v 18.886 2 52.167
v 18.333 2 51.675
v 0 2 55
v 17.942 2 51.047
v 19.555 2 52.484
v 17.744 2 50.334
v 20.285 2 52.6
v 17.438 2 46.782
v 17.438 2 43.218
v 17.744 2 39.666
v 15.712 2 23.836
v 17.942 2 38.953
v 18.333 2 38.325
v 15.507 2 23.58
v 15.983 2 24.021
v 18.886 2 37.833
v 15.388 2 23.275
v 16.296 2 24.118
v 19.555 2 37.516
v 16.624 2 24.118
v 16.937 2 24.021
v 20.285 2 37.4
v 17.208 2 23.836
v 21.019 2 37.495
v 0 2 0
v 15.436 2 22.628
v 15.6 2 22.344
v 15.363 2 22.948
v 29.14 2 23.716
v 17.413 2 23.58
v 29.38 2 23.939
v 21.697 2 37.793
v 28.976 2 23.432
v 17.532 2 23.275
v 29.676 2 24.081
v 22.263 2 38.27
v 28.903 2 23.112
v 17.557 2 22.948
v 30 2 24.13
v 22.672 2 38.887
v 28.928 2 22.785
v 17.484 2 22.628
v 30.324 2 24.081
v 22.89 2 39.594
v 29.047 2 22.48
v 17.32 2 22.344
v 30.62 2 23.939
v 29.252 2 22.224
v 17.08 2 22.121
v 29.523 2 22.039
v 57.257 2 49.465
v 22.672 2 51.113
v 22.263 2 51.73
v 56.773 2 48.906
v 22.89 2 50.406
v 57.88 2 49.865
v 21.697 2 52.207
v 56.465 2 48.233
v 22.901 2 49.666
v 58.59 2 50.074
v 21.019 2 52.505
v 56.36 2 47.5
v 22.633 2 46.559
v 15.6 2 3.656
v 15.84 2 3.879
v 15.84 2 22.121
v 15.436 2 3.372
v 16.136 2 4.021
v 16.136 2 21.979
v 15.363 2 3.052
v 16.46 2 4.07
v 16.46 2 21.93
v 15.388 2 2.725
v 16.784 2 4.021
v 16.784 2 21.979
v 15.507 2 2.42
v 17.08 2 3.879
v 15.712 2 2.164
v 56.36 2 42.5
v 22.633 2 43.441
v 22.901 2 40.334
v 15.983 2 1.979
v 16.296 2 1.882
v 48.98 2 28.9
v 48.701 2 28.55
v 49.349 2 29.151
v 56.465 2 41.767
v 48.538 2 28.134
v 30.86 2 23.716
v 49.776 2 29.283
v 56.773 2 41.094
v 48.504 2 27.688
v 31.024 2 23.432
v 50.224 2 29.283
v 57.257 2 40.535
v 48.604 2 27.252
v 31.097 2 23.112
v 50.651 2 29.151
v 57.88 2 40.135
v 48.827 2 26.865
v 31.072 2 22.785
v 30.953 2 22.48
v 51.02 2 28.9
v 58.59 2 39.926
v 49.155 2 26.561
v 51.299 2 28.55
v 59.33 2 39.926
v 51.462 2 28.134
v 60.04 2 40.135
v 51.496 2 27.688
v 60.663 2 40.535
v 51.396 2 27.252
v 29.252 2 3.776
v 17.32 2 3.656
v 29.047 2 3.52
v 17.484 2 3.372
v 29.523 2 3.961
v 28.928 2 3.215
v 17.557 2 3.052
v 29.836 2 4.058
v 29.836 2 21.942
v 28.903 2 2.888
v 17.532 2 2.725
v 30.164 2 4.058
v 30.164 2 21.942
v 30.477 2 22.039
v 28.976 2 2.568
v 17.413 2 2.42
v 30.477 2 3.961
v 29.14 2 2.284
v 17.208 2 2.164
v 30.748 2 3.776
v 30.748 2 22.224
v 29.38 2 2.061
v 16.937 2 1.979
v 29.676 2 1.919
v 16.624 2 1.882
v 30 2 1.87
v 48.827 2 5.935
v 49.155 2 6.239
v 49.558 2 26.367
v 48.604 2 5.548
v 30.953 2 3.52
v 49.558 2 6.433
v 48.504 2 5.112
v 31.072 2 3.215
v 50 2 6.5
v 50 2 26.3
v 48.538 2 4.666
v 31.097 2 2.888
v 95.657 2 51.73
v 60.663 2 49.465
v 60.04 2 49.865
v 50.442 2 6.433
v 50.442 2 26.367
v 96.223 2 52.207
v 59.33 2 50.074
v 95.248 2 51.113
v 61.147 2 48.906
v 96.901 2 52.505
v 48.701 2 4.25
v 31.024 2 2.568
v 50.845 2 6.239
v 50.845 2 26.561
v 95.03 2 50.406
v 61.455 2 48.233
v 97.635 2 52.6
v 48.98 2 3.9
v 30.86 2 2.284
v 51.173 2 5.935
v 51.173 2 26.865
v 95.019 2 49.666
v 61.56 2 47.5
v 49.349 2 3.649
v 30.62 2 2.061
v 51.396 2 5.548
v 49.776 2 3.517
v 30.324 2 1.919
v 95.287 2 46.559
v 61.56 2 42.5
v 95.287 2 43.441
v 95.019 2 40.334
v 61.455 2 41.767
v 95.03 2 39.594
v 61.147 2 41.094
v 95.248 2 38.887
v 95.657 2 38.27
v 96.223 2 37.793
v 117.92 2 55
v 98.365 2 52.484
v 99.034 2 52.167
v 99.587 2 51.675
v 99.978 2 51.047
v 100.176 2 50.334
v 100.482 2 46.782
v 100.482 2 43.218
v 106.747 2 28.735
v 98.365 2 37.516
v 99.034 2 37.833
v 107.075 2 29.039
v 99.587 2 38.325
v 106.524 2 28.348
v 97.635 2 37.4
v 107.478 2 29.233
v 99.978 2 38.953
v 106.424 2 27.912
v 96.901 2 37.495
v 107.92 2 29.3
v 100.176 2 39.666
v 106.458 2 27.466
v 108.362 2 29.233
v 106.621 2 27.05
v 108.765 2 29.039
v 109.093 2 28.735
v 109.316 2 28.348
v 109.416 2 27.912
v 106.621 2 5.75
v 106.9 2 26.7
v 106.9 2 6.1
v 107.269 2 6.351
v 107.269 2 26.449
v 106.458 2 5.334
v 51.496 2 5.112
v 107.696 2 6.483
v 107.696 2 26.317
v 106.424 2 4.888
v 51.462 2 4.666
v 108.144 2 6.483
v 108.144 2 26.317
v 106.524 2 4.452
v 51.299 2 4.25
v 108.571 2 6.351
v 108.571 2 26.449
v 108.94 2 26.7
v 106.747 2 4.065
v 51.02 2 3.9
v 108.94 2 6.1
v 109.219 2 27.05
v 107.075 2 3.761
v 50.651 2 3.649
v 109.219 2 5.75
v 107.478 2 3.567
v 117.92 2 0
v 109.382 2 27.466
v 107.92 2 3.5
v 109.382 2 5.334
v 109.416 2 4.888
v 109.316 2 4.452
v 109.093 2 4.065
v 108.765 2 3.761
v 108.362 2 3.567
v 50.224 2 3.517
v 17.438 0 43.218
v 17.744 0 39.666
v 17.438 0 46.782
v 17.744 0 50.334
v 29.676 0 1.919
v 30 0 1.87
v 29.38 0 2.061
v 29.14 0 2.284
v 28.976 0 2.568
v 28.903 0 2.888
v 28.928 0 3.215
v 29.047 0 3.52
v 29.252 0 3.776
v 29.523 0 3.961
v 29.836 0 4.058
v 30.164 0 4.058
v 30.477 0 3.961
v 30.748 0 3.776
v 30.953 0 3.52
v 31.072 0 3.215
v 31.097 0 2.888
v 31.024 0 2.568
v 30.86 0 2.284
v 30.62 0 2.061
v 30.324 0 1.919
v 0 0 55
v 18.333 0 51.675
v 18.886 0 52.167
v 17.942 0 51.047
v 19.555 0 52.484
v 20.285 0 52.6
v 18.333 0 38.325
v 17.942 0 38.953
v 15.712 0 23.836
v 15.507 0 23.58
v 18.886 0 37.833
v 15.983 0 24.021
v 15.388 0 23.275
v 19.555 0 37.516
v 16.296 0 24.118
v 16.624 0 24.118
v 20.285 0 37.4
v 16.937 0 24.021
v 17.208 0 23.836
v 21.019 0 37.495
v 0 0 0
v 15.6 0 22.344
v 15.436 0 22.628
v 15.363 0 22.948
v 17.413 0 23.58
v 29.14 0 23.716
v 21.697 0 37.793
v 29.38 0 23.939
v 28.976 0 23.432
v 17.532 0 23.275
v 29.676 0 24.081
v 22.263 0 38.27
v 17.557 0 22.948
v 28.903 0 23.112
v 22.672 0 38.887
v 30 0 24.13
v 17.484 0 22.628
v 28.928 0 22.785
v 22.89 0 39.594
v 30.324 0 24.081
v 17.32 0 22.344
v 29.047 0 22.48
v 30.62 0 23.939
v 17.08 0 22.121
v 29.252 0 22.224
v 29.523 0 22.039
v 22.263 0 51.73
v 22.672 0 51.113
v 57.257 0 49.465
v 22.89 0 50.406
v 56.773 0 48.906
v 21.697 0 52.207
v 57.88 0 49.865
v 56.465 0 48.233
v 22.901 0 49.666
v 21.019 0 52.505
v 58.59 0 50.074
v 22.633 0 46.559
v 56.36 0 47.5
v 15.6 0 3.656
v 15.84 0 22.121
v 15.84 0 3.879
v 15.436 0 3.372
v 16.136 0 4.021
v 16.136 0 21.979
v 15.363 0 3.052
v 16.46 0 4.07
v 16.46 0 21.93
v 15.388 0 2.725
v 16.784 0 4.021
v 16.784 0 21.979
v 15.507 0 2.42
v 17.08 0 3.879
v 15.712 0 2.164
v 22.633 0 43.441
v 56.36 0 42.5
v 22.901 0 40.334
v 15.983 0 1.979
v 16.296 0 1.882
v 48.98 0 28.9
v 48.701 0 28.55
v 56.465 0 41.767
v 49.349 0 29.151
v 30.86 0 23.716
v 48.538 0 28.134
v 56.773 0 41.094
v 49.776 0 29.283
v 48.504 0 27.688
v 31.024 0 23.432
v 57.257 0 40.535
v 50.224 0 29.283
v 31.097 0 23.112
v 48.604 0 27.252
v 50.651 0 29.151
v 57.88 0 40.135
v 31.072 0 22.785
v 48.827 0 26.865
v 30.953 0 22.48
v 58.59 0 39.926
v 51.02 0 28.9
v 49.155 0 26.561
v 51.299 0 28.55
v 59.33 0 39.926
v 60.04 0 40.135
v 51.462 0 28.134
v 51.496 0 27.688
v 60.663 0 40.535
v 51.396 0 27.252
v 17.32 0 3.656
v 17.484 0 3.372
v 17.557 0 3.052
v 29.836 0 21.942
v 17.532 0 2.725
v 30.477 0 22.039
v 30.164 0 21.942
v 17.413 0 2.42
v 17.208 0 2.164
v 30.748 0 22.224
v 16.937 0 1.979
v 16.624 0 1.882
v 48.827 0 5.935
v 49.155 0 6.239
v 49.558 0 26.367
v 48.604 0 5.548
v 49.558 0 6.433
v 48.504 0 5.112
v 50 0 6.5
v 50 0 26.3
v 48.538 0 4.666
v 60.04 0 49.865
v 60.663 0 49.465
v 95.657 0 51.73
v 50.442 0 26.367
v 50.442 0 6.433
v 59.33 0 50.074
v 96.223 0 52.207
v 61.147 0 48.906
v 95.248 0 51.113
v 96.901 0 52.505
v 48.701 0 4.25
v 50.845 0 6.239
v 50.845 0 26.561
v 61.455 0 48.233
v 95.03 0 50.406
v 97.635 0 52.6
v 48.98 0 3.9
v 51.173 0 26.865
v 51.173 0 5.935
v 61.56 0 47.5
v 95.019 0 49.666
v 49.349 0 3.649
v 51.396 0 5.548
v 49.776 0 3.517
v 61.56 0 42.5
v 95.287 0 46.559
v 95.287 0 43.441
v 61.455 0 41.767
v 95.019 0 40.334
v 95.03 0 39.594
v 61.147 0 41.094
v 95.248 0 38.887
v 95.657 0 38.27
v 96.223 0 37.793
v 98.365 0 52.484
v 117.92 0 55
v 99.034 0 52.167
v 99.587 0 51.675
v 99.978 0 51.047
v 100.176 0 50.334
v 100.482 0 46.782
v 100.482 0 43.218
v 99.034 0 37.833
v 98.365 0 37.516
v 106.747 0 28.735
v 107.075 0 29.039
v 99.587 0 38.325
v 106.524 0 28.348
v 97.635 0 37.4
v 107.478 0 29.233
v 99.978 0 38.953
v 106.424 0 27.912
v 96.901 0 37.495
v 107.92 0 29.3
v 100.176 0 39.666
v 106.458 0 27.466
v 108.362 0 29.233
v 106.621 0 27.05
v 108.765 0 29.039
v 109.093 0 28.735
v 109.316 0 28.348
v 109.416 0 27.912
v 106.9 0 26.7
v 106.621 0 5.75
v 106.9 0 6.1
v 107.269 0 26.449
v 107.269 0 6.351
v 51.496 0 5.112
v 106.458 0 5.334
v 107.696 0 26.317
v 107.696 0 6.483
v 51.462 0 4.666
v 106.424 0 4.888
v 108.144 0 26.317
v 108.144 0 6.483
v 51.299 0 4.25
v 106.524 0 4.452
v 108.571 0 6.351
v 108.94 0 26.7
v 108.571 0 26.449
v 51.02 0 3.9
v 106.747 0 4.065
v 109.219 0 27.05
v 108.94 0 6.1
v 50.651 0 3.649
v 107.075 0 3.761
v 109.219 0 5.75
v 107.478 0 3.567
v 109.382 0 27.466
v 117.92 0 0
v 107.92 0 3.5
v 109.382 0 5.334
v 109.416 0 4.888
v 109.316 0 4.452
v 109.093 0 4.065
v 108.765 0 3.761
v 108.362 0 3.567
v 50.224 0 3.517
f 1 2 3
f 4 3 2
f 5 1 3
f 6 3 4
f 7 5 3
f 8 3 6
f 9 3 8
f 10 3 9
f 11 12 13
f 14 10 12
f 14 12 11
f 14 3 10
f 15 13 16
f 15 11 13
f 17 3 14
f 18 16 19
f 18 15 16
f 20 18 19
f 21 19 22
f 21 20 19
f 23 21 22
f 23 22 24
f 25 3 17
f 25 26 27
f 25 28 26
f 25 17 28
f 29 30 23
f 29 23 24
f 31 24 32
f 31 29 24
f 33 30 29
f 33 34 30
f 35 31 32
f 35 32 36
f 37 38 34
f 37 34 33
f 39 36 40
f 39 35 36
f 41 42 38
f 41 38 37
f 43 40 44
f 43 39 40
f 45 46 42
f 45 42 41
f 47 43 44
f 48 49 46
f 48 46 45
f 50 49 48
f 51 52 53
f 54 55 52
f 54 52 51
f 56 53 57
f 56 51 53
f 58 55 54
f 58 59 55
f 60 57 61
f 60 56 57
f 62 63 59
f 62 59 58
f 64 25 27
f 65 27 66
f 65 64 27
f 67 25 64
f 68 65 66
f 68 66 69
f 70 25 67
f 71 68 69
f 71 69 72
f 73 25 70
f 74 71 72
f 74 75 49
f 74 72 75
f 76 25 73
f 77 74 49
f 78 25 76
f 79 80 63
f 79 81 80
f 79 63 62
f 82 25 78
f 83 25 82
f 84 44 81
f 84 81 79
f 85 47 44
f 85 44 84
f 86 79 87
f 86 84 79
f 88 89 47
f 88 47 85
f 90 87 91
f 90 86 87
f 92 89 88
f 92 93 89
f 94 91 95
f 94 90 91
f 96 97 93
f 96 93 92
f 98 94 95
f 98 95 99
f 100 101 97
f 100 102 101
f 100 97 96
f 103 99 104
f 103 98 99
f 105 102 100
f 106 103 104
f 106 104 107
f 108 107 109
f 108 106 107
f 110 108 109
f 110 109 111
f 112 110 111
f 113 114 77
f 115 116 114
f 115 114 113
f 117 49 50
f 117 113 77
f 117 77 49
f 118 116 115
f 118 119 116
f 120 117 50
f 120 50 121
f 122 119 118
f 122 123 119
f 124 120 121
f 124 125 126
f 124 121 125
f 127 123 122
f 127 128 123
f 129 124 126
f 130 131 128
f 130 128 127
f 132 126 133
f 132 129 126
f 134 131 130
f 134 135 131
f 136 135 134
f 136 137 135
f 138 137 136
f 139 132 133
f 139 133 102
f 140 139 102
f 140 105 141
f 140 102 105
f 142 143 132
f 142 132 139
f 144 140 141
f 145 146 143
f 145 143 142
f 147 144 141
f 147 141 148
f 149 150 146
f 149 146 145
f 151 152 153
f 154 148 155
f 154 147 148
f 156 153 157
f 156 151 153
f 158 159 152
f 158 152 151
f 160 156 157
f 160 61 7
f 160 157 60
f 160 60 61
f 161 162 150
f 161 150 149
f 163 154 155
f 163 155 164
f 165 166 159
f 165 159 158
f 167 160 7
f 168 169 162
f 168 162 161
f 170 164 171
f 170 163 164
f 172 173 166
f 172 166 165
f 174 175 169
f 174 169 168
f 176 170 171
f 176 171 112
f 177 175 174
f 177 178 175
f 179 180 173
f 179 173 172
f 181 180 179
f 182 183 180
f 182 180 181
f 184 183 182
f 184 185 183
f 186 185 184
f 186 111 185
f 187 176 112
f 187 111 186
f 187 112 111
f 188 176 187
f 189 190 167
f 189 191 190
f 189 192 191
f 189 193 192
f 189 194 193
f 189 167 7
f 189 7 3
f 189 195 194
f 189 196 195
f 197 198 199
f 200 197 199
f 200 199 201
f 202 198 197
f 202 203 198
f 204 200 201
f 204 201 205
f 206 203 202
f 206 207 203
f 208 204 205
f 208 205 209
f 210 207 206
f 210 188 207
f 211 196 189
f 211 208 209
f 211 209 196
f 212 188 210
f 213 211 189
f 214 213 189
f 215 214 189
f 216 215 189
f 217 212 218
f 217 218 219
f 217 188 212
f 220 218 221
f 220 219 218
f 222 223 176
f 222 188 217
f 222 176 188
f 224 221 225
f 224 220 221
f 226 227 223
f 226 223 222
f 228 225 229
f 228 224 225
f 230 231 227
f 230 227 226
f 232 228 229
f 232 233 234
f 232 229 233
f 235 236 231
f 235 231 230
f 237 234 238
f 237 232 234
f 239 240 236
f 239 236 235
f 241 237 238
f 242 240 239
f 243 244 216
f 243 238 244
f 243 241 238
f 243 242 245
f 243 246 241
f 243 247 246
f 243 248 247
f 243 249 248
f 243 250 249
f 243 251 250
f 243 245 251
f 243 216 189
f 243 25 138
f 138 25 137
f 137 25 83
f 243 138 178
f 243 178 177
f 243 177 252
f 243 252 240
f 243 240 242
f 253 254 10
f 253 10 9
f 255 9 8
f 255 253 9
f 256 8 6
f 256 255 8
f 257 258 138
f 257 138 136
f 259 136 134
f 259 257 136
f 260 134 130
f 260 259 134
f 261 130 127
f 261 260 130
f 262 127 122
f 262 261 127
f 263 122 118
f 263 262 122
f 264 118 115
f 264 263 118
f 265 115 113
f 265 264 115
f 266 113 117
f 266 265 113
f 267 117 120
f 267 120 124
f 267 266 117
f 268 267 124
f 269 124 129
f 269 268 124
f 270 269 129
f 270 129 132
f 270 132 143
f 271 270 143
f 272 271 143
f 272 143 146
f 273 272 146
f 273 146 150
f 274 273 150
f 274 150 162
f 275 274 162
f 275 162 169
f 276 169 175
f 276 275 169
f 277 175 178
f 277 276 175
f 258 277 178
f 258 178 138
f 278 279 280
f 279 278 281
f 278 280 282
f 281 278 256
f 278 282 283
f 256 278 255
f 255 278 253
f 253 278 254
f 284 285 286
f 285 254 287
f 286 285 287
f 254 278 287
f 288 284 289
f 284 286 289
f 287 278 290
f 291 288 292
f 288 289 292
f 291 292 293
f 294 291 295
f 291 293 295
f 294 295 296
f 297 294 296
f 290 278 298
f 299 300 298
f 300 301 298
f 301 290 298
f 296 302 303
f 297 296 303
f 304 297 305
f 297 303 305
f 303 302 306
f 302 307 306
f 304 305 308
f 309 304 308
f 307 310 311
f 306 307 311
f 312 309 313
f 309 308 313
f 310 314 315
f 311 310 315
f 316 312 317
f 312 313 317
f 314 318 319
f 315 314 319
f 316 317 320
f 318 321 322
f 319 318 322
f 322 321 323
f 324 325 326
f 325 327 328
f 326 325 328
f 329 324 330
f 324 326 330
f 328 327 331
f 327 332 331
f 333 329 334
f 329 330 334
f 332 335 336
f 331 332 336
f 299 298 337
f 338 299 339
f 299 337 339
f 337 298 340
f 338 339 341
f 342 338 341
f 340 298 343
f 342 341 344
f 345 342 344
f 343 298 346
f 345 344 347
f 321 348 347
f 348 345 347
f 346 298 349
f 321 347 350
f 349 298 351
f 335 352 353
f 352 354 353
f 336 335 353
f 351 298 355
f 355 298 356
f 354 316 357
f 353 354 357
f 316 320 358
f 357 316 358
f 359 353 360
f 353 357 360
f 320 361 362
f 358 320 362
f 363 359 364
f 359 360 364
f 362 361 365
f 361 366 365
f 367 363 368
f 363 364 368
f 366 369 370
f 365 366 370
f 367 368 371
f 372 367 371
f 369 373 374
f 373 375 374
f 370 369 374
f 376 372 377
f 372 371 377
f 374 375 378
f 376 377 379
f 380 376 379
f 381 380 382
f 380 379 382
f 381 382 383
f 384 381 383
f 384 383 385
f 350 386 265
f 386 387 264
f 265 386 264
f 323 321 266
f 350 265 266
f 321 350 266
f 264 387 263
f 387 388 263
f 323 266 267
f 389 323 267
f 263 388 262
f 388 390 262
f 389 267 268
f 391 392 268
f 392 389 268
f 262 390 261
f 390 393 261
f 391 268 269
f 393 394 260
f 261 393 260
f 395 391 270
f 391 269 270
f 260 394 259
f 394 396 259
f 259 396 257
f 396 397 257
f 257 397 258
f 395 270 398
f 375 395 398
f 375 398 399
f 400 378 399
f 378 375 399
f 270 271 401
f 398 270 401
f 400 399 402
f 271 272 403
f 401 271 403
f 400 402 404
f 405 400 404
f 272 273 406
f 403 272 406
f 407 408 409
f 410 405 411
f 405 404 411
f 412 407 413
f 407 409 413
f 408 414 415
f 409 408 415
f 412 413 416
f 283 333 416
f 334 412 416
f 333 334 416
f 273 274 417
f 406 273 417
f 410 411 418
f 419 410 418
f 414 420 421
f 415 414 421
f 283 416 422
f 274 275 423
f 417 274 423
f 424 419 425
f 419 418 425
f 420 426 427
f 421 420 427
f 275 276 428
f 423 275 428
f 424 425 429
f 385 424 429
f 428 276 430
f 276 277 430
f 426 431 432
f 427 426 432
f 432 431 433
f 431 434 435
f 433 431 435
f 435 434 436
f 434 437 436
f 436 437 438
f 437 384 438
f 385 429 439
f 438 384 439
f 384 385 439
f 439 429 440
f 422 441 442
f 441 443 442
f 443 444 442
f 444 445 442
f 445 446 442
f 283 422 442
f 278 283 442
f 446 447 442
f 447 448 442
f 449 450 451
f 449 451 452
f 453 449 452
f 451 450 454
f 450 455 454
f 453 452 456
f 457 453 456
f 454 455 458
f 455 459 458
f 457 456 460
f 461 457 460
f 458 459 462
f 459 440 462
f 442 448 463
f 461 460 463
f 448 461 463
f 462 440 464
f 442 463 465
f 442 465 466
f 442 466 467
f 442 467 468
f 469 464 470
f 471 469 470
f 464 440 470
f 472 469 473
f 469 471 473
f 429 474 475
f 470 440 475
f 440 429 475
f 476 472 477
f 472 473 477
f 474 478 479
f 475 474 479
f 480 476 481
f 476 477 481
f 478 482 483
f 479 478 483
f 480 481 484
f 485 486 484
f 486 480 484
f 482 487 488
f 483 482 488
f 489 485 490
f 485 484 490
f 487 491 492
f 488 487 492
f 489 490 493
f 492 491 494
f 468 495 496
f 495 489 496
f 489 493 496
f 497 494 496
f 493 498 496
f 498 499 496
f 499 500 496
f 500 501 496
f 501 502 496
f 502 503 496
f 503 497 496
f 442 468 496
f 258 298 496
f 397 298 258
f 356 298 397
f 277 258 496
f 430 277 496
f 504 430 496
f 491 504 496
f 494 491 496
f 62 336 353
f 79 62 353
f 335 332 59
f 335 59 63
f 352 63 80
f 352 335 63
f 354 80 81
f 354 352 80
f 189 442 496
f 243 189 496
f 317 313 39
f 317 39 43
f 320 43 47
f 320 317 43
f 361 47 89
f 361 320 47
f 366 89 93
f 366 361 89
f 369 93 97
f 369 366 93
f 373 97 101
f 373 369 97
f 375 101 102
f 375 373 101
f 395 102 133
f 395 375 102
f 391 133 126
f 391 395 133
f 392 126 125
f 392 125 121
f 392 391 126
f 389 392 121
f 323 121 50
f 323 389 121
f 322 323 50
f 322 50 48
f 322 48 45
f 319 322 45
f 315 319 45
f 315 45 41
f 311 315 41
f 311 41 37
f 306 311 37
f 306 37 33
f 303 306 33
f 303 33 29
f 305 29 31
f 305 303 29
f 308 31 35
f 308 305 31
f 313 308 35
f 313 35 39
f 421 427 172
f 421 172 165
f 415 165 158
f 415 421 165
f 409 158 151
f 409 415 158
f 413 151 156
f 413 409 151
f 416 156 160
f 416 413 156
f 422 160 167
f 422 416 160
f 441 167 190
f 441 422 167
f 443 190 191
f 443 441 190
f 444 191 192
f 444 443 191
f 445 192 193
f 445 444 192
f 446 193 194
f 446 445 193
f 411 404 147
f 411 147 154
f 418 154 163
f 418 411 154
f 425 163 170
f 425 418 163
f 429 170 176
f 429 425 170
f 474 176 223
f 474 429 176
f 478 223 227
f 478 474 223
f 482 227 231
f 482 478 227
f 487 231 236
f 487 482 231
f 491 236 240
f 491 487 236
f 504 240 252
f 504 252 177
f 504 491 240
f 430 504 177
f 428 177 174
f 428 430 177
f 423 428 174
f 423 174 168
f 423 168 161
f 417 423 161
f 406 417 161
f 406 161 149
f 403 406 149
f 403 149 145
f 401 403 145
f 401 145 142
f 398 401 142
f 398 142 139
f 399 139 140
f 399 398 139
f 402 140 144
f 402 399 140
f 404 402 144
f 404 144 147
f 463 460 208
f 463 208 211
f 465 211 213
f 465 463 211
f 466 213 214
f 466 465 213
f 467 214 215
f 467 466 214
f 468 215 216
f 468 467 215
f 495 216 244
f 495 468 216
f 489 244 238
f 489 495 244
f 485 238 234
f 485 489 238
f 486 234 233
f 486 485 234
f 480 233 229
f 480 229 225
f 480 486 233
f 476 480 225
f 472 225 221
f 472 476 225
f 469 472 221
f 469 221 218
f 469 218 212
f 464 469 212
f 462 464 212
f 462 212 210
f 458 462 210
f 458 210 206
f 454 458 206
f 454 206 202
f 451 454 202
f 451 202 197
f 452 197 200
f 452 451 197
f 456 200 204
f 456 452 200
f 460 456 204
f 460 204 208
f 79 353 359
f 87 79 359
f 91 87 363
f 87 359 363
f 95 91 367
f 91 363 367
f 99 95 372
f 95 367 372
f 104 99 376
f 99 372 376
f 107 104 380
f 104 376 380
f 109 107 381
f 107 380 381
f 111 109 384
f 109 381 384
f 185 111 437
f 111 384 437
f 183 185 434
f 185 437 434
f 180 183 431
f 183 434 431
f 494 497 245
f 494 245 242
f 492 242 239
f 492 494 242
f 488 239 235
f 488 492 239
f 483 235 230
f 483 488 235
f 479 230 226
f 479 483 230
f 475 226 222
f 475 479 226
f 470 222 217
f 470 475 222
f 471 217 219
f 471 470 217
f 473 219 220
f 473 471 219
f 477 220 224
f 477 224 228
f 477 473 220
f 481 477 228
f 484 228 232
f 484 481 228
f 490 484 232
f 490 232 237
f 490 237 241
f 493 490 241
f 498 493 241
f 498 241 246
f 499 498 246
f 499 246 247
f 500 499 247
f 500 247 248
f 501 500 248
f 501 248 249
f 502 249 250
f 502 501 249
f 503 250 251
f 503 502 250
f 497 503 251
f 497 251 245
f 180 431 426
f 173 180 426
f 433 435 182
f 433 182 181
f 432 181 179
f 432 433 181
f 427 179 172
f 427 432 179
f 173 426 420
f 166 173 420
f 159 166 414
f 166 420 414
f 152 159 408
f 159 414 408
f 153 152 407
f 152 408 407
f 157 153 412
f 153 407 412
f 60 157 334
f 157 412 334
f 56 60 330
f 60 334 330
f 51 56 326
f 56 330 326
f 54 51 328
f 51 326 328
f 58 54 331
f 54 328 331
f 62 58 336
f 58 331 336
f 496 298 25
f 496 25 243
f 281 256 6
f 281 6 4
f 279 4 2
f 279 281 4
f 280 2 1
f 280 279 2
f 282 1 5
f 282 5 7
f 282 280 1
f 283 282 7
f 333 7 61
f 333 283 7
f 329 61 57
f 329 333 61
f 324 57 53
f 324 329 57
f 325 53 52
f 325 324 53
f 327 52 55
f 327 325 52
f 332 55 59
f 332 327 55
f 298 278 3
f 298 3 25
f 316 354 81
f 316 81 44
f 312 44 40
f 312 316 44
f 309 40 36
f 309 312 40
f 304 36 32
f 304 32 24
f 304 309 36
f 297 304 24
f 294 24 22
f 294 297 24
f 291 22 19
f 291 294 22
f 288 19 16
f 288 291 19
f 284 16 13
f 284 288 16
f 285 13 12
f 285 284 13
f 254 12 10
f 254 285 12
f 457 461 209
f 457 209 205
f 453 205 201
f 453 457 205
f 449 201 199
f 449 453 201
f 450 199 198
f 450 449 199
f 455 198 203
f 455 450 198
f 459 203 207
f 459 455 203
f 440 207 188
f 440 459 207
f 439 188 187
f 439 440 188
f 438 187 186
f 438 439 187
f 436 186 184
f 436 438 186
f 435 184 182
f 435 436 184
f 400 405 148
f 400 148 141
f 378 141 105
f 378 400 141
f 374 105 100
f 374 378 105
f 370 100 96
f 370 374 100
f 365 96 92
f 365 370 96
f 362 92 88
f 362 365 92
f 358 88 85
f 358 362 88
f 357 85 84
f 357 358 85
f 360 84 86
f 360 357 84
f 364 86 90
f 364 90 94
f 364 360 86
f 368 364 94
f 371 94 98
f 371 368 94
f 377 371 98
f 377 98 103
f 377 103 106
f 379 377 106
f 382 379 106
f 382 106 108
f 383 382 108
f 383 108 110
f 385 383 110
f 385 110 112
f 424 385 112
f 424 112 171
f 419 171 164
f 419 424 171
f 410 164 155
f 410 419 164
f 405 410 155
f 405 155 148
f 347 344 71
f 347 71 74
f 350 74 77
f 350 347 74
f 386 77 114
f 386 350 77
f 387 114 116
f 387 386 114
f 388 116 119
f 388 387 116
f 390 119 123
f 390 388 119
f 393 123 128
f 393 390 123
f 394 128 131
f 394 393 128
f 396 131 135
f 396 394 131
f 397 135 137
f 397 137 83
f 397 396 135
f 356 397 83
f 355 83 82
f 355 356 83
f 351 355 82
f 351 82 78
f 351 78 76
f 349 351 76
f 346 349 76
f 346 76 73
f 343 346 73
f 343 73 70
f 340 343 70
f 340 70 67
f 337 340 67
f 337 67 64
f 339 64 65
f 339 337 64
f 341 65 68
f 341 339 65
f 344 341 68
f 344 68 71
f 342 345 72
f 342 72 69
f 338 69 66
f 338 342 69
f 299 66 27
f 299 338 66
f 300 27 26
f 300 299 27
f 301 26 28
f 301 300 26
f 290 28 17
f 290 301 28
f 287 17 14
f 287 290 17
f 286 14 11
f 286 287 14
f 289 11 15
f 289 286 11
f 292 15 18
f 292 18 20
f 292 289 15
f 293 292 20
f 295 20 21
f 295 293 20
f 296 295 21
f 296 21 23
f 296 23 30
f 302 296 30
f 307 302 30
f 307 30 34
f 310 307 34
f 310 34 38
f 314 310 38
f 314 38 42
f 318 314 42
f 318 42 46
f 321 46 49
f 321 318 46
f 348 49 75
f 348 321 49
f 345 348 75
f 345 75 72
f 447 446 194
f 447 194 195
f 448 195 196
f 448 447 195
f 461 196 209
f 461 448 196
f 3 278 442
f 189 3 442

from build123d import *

# Parameters (mm, degrees)
SKETCH_1_W      = 117.92
SKETCH_1_H      = 55
SKETCH_1_R      = 1.1
SKETCH_1_R_2    = 1.5
EXTRUDE_1_DEPTH = 2


with BuildPart() as part:
    # 草图1 → 凸台-拉伸1 (new body)
    with BuildSketch(Plane(origin=(0, 0, 0), x_dir=(1, 0, 0), z_dir=(0, 1, 0))):
        with Locations((58.96, -27.5)):
            Rectangle(SKETCH_1_W, SKETCH_1_H)
        with Locations(Location((16.46, -2.97, 0), (0, 0, 270))):
            Circle(SKETCH_1_R, mode=Mode.SUBTRACT)
        with Locations(Location((30, -2.97, 0), (0, 0, 90))):
            Circle(SKETCH_1_R, mode=Mode.SUBTRACT)
        with Locations(Location((30, -23.03, 0), (0, 0, 270))):
            Circle(SKETCH_1_R, mode=Mode.SUBTRACT)
        with Locations(Location((16.46, -23.03, 0), (0, 0, 90))):
            Circle(SKETCH_1_R, mode=Mode.SUBTRACT)
        with Locations(Location((50, -5, 0), (0, 0, 270))):
            Circle(SKETCH_1_R_2, mode=Mode.SUBTRACT)
        with Locations(Location((107.92, -5, 0), (0, 0, 90))):
            Circle(SKETCH_1_R_2, mode=Mode.SUBTRACT)
        with Locations(Location((107.92, -27.8, 0), (0, 0, 270))):
            Circle(SKETCH_1_R_2, mode=Mode.SUBTRACT)
        with Locations(Location((50, -27.8, 0), (0, 0, 90))):
            Circle(SKETCH_1_R_2, mode=Mode.SUBTRACT)
        with BuildLine():
            Line((56.36, -47.5), (56.36, -42.5))
            ThreePointArc((56.36, -42.5), (58.96, -39.9), (61.56, -42.5))
            Line((61.56, -42.5), (61.56, -47.5))
            ThreePointArc((61.56, -47.5), (58.96, -50.1), (56.36, -47.5))
        make_face(mode=Mode.SUBTRACT)
        with BuildLine():
            ThreePointArc((95.019326342, -40.333675565), (95.32, -45), (95.019326342, -49.666324435))
            ThreePointArc((95.019326342, -49.666324435), (97.264150461, -52.578499683), (100.176325709, -50.333675565))
            ThreePointArc((100.176325709, -50.333675565), (100.52, -45), (100.176325709, -39.666324435))
            ThreePointArc((100.176325709, -39.666324435), (97.264150461, -37.421500317), (95.019326342, -40.333675565))
        make_face(mode=Mode.SUBTRACT)
        with BuildLine():
            ThreePointArc((22.900673658, -40.333675565), (20.655849539, -37.421500317), (17.743674291, -39.666324435))
            ThreePointArc((17.743674291, -39.666324435), (17.4, -45), (17.743674291, -50.333675565))
            ThreePointArc((17.743674291, -50.333675565), (20.655849539, -52.578499683), (22.900673658, -49.666324435))
            ThreePointArc((22.900673658, -49.666324435), (22.6, -45), (22.900673658, -40.333675565))
        make_face(mode=Mode.SUBTRACT)
    extrude(amount=EXTRUDE_1_DEPTH)


solid = part.part
